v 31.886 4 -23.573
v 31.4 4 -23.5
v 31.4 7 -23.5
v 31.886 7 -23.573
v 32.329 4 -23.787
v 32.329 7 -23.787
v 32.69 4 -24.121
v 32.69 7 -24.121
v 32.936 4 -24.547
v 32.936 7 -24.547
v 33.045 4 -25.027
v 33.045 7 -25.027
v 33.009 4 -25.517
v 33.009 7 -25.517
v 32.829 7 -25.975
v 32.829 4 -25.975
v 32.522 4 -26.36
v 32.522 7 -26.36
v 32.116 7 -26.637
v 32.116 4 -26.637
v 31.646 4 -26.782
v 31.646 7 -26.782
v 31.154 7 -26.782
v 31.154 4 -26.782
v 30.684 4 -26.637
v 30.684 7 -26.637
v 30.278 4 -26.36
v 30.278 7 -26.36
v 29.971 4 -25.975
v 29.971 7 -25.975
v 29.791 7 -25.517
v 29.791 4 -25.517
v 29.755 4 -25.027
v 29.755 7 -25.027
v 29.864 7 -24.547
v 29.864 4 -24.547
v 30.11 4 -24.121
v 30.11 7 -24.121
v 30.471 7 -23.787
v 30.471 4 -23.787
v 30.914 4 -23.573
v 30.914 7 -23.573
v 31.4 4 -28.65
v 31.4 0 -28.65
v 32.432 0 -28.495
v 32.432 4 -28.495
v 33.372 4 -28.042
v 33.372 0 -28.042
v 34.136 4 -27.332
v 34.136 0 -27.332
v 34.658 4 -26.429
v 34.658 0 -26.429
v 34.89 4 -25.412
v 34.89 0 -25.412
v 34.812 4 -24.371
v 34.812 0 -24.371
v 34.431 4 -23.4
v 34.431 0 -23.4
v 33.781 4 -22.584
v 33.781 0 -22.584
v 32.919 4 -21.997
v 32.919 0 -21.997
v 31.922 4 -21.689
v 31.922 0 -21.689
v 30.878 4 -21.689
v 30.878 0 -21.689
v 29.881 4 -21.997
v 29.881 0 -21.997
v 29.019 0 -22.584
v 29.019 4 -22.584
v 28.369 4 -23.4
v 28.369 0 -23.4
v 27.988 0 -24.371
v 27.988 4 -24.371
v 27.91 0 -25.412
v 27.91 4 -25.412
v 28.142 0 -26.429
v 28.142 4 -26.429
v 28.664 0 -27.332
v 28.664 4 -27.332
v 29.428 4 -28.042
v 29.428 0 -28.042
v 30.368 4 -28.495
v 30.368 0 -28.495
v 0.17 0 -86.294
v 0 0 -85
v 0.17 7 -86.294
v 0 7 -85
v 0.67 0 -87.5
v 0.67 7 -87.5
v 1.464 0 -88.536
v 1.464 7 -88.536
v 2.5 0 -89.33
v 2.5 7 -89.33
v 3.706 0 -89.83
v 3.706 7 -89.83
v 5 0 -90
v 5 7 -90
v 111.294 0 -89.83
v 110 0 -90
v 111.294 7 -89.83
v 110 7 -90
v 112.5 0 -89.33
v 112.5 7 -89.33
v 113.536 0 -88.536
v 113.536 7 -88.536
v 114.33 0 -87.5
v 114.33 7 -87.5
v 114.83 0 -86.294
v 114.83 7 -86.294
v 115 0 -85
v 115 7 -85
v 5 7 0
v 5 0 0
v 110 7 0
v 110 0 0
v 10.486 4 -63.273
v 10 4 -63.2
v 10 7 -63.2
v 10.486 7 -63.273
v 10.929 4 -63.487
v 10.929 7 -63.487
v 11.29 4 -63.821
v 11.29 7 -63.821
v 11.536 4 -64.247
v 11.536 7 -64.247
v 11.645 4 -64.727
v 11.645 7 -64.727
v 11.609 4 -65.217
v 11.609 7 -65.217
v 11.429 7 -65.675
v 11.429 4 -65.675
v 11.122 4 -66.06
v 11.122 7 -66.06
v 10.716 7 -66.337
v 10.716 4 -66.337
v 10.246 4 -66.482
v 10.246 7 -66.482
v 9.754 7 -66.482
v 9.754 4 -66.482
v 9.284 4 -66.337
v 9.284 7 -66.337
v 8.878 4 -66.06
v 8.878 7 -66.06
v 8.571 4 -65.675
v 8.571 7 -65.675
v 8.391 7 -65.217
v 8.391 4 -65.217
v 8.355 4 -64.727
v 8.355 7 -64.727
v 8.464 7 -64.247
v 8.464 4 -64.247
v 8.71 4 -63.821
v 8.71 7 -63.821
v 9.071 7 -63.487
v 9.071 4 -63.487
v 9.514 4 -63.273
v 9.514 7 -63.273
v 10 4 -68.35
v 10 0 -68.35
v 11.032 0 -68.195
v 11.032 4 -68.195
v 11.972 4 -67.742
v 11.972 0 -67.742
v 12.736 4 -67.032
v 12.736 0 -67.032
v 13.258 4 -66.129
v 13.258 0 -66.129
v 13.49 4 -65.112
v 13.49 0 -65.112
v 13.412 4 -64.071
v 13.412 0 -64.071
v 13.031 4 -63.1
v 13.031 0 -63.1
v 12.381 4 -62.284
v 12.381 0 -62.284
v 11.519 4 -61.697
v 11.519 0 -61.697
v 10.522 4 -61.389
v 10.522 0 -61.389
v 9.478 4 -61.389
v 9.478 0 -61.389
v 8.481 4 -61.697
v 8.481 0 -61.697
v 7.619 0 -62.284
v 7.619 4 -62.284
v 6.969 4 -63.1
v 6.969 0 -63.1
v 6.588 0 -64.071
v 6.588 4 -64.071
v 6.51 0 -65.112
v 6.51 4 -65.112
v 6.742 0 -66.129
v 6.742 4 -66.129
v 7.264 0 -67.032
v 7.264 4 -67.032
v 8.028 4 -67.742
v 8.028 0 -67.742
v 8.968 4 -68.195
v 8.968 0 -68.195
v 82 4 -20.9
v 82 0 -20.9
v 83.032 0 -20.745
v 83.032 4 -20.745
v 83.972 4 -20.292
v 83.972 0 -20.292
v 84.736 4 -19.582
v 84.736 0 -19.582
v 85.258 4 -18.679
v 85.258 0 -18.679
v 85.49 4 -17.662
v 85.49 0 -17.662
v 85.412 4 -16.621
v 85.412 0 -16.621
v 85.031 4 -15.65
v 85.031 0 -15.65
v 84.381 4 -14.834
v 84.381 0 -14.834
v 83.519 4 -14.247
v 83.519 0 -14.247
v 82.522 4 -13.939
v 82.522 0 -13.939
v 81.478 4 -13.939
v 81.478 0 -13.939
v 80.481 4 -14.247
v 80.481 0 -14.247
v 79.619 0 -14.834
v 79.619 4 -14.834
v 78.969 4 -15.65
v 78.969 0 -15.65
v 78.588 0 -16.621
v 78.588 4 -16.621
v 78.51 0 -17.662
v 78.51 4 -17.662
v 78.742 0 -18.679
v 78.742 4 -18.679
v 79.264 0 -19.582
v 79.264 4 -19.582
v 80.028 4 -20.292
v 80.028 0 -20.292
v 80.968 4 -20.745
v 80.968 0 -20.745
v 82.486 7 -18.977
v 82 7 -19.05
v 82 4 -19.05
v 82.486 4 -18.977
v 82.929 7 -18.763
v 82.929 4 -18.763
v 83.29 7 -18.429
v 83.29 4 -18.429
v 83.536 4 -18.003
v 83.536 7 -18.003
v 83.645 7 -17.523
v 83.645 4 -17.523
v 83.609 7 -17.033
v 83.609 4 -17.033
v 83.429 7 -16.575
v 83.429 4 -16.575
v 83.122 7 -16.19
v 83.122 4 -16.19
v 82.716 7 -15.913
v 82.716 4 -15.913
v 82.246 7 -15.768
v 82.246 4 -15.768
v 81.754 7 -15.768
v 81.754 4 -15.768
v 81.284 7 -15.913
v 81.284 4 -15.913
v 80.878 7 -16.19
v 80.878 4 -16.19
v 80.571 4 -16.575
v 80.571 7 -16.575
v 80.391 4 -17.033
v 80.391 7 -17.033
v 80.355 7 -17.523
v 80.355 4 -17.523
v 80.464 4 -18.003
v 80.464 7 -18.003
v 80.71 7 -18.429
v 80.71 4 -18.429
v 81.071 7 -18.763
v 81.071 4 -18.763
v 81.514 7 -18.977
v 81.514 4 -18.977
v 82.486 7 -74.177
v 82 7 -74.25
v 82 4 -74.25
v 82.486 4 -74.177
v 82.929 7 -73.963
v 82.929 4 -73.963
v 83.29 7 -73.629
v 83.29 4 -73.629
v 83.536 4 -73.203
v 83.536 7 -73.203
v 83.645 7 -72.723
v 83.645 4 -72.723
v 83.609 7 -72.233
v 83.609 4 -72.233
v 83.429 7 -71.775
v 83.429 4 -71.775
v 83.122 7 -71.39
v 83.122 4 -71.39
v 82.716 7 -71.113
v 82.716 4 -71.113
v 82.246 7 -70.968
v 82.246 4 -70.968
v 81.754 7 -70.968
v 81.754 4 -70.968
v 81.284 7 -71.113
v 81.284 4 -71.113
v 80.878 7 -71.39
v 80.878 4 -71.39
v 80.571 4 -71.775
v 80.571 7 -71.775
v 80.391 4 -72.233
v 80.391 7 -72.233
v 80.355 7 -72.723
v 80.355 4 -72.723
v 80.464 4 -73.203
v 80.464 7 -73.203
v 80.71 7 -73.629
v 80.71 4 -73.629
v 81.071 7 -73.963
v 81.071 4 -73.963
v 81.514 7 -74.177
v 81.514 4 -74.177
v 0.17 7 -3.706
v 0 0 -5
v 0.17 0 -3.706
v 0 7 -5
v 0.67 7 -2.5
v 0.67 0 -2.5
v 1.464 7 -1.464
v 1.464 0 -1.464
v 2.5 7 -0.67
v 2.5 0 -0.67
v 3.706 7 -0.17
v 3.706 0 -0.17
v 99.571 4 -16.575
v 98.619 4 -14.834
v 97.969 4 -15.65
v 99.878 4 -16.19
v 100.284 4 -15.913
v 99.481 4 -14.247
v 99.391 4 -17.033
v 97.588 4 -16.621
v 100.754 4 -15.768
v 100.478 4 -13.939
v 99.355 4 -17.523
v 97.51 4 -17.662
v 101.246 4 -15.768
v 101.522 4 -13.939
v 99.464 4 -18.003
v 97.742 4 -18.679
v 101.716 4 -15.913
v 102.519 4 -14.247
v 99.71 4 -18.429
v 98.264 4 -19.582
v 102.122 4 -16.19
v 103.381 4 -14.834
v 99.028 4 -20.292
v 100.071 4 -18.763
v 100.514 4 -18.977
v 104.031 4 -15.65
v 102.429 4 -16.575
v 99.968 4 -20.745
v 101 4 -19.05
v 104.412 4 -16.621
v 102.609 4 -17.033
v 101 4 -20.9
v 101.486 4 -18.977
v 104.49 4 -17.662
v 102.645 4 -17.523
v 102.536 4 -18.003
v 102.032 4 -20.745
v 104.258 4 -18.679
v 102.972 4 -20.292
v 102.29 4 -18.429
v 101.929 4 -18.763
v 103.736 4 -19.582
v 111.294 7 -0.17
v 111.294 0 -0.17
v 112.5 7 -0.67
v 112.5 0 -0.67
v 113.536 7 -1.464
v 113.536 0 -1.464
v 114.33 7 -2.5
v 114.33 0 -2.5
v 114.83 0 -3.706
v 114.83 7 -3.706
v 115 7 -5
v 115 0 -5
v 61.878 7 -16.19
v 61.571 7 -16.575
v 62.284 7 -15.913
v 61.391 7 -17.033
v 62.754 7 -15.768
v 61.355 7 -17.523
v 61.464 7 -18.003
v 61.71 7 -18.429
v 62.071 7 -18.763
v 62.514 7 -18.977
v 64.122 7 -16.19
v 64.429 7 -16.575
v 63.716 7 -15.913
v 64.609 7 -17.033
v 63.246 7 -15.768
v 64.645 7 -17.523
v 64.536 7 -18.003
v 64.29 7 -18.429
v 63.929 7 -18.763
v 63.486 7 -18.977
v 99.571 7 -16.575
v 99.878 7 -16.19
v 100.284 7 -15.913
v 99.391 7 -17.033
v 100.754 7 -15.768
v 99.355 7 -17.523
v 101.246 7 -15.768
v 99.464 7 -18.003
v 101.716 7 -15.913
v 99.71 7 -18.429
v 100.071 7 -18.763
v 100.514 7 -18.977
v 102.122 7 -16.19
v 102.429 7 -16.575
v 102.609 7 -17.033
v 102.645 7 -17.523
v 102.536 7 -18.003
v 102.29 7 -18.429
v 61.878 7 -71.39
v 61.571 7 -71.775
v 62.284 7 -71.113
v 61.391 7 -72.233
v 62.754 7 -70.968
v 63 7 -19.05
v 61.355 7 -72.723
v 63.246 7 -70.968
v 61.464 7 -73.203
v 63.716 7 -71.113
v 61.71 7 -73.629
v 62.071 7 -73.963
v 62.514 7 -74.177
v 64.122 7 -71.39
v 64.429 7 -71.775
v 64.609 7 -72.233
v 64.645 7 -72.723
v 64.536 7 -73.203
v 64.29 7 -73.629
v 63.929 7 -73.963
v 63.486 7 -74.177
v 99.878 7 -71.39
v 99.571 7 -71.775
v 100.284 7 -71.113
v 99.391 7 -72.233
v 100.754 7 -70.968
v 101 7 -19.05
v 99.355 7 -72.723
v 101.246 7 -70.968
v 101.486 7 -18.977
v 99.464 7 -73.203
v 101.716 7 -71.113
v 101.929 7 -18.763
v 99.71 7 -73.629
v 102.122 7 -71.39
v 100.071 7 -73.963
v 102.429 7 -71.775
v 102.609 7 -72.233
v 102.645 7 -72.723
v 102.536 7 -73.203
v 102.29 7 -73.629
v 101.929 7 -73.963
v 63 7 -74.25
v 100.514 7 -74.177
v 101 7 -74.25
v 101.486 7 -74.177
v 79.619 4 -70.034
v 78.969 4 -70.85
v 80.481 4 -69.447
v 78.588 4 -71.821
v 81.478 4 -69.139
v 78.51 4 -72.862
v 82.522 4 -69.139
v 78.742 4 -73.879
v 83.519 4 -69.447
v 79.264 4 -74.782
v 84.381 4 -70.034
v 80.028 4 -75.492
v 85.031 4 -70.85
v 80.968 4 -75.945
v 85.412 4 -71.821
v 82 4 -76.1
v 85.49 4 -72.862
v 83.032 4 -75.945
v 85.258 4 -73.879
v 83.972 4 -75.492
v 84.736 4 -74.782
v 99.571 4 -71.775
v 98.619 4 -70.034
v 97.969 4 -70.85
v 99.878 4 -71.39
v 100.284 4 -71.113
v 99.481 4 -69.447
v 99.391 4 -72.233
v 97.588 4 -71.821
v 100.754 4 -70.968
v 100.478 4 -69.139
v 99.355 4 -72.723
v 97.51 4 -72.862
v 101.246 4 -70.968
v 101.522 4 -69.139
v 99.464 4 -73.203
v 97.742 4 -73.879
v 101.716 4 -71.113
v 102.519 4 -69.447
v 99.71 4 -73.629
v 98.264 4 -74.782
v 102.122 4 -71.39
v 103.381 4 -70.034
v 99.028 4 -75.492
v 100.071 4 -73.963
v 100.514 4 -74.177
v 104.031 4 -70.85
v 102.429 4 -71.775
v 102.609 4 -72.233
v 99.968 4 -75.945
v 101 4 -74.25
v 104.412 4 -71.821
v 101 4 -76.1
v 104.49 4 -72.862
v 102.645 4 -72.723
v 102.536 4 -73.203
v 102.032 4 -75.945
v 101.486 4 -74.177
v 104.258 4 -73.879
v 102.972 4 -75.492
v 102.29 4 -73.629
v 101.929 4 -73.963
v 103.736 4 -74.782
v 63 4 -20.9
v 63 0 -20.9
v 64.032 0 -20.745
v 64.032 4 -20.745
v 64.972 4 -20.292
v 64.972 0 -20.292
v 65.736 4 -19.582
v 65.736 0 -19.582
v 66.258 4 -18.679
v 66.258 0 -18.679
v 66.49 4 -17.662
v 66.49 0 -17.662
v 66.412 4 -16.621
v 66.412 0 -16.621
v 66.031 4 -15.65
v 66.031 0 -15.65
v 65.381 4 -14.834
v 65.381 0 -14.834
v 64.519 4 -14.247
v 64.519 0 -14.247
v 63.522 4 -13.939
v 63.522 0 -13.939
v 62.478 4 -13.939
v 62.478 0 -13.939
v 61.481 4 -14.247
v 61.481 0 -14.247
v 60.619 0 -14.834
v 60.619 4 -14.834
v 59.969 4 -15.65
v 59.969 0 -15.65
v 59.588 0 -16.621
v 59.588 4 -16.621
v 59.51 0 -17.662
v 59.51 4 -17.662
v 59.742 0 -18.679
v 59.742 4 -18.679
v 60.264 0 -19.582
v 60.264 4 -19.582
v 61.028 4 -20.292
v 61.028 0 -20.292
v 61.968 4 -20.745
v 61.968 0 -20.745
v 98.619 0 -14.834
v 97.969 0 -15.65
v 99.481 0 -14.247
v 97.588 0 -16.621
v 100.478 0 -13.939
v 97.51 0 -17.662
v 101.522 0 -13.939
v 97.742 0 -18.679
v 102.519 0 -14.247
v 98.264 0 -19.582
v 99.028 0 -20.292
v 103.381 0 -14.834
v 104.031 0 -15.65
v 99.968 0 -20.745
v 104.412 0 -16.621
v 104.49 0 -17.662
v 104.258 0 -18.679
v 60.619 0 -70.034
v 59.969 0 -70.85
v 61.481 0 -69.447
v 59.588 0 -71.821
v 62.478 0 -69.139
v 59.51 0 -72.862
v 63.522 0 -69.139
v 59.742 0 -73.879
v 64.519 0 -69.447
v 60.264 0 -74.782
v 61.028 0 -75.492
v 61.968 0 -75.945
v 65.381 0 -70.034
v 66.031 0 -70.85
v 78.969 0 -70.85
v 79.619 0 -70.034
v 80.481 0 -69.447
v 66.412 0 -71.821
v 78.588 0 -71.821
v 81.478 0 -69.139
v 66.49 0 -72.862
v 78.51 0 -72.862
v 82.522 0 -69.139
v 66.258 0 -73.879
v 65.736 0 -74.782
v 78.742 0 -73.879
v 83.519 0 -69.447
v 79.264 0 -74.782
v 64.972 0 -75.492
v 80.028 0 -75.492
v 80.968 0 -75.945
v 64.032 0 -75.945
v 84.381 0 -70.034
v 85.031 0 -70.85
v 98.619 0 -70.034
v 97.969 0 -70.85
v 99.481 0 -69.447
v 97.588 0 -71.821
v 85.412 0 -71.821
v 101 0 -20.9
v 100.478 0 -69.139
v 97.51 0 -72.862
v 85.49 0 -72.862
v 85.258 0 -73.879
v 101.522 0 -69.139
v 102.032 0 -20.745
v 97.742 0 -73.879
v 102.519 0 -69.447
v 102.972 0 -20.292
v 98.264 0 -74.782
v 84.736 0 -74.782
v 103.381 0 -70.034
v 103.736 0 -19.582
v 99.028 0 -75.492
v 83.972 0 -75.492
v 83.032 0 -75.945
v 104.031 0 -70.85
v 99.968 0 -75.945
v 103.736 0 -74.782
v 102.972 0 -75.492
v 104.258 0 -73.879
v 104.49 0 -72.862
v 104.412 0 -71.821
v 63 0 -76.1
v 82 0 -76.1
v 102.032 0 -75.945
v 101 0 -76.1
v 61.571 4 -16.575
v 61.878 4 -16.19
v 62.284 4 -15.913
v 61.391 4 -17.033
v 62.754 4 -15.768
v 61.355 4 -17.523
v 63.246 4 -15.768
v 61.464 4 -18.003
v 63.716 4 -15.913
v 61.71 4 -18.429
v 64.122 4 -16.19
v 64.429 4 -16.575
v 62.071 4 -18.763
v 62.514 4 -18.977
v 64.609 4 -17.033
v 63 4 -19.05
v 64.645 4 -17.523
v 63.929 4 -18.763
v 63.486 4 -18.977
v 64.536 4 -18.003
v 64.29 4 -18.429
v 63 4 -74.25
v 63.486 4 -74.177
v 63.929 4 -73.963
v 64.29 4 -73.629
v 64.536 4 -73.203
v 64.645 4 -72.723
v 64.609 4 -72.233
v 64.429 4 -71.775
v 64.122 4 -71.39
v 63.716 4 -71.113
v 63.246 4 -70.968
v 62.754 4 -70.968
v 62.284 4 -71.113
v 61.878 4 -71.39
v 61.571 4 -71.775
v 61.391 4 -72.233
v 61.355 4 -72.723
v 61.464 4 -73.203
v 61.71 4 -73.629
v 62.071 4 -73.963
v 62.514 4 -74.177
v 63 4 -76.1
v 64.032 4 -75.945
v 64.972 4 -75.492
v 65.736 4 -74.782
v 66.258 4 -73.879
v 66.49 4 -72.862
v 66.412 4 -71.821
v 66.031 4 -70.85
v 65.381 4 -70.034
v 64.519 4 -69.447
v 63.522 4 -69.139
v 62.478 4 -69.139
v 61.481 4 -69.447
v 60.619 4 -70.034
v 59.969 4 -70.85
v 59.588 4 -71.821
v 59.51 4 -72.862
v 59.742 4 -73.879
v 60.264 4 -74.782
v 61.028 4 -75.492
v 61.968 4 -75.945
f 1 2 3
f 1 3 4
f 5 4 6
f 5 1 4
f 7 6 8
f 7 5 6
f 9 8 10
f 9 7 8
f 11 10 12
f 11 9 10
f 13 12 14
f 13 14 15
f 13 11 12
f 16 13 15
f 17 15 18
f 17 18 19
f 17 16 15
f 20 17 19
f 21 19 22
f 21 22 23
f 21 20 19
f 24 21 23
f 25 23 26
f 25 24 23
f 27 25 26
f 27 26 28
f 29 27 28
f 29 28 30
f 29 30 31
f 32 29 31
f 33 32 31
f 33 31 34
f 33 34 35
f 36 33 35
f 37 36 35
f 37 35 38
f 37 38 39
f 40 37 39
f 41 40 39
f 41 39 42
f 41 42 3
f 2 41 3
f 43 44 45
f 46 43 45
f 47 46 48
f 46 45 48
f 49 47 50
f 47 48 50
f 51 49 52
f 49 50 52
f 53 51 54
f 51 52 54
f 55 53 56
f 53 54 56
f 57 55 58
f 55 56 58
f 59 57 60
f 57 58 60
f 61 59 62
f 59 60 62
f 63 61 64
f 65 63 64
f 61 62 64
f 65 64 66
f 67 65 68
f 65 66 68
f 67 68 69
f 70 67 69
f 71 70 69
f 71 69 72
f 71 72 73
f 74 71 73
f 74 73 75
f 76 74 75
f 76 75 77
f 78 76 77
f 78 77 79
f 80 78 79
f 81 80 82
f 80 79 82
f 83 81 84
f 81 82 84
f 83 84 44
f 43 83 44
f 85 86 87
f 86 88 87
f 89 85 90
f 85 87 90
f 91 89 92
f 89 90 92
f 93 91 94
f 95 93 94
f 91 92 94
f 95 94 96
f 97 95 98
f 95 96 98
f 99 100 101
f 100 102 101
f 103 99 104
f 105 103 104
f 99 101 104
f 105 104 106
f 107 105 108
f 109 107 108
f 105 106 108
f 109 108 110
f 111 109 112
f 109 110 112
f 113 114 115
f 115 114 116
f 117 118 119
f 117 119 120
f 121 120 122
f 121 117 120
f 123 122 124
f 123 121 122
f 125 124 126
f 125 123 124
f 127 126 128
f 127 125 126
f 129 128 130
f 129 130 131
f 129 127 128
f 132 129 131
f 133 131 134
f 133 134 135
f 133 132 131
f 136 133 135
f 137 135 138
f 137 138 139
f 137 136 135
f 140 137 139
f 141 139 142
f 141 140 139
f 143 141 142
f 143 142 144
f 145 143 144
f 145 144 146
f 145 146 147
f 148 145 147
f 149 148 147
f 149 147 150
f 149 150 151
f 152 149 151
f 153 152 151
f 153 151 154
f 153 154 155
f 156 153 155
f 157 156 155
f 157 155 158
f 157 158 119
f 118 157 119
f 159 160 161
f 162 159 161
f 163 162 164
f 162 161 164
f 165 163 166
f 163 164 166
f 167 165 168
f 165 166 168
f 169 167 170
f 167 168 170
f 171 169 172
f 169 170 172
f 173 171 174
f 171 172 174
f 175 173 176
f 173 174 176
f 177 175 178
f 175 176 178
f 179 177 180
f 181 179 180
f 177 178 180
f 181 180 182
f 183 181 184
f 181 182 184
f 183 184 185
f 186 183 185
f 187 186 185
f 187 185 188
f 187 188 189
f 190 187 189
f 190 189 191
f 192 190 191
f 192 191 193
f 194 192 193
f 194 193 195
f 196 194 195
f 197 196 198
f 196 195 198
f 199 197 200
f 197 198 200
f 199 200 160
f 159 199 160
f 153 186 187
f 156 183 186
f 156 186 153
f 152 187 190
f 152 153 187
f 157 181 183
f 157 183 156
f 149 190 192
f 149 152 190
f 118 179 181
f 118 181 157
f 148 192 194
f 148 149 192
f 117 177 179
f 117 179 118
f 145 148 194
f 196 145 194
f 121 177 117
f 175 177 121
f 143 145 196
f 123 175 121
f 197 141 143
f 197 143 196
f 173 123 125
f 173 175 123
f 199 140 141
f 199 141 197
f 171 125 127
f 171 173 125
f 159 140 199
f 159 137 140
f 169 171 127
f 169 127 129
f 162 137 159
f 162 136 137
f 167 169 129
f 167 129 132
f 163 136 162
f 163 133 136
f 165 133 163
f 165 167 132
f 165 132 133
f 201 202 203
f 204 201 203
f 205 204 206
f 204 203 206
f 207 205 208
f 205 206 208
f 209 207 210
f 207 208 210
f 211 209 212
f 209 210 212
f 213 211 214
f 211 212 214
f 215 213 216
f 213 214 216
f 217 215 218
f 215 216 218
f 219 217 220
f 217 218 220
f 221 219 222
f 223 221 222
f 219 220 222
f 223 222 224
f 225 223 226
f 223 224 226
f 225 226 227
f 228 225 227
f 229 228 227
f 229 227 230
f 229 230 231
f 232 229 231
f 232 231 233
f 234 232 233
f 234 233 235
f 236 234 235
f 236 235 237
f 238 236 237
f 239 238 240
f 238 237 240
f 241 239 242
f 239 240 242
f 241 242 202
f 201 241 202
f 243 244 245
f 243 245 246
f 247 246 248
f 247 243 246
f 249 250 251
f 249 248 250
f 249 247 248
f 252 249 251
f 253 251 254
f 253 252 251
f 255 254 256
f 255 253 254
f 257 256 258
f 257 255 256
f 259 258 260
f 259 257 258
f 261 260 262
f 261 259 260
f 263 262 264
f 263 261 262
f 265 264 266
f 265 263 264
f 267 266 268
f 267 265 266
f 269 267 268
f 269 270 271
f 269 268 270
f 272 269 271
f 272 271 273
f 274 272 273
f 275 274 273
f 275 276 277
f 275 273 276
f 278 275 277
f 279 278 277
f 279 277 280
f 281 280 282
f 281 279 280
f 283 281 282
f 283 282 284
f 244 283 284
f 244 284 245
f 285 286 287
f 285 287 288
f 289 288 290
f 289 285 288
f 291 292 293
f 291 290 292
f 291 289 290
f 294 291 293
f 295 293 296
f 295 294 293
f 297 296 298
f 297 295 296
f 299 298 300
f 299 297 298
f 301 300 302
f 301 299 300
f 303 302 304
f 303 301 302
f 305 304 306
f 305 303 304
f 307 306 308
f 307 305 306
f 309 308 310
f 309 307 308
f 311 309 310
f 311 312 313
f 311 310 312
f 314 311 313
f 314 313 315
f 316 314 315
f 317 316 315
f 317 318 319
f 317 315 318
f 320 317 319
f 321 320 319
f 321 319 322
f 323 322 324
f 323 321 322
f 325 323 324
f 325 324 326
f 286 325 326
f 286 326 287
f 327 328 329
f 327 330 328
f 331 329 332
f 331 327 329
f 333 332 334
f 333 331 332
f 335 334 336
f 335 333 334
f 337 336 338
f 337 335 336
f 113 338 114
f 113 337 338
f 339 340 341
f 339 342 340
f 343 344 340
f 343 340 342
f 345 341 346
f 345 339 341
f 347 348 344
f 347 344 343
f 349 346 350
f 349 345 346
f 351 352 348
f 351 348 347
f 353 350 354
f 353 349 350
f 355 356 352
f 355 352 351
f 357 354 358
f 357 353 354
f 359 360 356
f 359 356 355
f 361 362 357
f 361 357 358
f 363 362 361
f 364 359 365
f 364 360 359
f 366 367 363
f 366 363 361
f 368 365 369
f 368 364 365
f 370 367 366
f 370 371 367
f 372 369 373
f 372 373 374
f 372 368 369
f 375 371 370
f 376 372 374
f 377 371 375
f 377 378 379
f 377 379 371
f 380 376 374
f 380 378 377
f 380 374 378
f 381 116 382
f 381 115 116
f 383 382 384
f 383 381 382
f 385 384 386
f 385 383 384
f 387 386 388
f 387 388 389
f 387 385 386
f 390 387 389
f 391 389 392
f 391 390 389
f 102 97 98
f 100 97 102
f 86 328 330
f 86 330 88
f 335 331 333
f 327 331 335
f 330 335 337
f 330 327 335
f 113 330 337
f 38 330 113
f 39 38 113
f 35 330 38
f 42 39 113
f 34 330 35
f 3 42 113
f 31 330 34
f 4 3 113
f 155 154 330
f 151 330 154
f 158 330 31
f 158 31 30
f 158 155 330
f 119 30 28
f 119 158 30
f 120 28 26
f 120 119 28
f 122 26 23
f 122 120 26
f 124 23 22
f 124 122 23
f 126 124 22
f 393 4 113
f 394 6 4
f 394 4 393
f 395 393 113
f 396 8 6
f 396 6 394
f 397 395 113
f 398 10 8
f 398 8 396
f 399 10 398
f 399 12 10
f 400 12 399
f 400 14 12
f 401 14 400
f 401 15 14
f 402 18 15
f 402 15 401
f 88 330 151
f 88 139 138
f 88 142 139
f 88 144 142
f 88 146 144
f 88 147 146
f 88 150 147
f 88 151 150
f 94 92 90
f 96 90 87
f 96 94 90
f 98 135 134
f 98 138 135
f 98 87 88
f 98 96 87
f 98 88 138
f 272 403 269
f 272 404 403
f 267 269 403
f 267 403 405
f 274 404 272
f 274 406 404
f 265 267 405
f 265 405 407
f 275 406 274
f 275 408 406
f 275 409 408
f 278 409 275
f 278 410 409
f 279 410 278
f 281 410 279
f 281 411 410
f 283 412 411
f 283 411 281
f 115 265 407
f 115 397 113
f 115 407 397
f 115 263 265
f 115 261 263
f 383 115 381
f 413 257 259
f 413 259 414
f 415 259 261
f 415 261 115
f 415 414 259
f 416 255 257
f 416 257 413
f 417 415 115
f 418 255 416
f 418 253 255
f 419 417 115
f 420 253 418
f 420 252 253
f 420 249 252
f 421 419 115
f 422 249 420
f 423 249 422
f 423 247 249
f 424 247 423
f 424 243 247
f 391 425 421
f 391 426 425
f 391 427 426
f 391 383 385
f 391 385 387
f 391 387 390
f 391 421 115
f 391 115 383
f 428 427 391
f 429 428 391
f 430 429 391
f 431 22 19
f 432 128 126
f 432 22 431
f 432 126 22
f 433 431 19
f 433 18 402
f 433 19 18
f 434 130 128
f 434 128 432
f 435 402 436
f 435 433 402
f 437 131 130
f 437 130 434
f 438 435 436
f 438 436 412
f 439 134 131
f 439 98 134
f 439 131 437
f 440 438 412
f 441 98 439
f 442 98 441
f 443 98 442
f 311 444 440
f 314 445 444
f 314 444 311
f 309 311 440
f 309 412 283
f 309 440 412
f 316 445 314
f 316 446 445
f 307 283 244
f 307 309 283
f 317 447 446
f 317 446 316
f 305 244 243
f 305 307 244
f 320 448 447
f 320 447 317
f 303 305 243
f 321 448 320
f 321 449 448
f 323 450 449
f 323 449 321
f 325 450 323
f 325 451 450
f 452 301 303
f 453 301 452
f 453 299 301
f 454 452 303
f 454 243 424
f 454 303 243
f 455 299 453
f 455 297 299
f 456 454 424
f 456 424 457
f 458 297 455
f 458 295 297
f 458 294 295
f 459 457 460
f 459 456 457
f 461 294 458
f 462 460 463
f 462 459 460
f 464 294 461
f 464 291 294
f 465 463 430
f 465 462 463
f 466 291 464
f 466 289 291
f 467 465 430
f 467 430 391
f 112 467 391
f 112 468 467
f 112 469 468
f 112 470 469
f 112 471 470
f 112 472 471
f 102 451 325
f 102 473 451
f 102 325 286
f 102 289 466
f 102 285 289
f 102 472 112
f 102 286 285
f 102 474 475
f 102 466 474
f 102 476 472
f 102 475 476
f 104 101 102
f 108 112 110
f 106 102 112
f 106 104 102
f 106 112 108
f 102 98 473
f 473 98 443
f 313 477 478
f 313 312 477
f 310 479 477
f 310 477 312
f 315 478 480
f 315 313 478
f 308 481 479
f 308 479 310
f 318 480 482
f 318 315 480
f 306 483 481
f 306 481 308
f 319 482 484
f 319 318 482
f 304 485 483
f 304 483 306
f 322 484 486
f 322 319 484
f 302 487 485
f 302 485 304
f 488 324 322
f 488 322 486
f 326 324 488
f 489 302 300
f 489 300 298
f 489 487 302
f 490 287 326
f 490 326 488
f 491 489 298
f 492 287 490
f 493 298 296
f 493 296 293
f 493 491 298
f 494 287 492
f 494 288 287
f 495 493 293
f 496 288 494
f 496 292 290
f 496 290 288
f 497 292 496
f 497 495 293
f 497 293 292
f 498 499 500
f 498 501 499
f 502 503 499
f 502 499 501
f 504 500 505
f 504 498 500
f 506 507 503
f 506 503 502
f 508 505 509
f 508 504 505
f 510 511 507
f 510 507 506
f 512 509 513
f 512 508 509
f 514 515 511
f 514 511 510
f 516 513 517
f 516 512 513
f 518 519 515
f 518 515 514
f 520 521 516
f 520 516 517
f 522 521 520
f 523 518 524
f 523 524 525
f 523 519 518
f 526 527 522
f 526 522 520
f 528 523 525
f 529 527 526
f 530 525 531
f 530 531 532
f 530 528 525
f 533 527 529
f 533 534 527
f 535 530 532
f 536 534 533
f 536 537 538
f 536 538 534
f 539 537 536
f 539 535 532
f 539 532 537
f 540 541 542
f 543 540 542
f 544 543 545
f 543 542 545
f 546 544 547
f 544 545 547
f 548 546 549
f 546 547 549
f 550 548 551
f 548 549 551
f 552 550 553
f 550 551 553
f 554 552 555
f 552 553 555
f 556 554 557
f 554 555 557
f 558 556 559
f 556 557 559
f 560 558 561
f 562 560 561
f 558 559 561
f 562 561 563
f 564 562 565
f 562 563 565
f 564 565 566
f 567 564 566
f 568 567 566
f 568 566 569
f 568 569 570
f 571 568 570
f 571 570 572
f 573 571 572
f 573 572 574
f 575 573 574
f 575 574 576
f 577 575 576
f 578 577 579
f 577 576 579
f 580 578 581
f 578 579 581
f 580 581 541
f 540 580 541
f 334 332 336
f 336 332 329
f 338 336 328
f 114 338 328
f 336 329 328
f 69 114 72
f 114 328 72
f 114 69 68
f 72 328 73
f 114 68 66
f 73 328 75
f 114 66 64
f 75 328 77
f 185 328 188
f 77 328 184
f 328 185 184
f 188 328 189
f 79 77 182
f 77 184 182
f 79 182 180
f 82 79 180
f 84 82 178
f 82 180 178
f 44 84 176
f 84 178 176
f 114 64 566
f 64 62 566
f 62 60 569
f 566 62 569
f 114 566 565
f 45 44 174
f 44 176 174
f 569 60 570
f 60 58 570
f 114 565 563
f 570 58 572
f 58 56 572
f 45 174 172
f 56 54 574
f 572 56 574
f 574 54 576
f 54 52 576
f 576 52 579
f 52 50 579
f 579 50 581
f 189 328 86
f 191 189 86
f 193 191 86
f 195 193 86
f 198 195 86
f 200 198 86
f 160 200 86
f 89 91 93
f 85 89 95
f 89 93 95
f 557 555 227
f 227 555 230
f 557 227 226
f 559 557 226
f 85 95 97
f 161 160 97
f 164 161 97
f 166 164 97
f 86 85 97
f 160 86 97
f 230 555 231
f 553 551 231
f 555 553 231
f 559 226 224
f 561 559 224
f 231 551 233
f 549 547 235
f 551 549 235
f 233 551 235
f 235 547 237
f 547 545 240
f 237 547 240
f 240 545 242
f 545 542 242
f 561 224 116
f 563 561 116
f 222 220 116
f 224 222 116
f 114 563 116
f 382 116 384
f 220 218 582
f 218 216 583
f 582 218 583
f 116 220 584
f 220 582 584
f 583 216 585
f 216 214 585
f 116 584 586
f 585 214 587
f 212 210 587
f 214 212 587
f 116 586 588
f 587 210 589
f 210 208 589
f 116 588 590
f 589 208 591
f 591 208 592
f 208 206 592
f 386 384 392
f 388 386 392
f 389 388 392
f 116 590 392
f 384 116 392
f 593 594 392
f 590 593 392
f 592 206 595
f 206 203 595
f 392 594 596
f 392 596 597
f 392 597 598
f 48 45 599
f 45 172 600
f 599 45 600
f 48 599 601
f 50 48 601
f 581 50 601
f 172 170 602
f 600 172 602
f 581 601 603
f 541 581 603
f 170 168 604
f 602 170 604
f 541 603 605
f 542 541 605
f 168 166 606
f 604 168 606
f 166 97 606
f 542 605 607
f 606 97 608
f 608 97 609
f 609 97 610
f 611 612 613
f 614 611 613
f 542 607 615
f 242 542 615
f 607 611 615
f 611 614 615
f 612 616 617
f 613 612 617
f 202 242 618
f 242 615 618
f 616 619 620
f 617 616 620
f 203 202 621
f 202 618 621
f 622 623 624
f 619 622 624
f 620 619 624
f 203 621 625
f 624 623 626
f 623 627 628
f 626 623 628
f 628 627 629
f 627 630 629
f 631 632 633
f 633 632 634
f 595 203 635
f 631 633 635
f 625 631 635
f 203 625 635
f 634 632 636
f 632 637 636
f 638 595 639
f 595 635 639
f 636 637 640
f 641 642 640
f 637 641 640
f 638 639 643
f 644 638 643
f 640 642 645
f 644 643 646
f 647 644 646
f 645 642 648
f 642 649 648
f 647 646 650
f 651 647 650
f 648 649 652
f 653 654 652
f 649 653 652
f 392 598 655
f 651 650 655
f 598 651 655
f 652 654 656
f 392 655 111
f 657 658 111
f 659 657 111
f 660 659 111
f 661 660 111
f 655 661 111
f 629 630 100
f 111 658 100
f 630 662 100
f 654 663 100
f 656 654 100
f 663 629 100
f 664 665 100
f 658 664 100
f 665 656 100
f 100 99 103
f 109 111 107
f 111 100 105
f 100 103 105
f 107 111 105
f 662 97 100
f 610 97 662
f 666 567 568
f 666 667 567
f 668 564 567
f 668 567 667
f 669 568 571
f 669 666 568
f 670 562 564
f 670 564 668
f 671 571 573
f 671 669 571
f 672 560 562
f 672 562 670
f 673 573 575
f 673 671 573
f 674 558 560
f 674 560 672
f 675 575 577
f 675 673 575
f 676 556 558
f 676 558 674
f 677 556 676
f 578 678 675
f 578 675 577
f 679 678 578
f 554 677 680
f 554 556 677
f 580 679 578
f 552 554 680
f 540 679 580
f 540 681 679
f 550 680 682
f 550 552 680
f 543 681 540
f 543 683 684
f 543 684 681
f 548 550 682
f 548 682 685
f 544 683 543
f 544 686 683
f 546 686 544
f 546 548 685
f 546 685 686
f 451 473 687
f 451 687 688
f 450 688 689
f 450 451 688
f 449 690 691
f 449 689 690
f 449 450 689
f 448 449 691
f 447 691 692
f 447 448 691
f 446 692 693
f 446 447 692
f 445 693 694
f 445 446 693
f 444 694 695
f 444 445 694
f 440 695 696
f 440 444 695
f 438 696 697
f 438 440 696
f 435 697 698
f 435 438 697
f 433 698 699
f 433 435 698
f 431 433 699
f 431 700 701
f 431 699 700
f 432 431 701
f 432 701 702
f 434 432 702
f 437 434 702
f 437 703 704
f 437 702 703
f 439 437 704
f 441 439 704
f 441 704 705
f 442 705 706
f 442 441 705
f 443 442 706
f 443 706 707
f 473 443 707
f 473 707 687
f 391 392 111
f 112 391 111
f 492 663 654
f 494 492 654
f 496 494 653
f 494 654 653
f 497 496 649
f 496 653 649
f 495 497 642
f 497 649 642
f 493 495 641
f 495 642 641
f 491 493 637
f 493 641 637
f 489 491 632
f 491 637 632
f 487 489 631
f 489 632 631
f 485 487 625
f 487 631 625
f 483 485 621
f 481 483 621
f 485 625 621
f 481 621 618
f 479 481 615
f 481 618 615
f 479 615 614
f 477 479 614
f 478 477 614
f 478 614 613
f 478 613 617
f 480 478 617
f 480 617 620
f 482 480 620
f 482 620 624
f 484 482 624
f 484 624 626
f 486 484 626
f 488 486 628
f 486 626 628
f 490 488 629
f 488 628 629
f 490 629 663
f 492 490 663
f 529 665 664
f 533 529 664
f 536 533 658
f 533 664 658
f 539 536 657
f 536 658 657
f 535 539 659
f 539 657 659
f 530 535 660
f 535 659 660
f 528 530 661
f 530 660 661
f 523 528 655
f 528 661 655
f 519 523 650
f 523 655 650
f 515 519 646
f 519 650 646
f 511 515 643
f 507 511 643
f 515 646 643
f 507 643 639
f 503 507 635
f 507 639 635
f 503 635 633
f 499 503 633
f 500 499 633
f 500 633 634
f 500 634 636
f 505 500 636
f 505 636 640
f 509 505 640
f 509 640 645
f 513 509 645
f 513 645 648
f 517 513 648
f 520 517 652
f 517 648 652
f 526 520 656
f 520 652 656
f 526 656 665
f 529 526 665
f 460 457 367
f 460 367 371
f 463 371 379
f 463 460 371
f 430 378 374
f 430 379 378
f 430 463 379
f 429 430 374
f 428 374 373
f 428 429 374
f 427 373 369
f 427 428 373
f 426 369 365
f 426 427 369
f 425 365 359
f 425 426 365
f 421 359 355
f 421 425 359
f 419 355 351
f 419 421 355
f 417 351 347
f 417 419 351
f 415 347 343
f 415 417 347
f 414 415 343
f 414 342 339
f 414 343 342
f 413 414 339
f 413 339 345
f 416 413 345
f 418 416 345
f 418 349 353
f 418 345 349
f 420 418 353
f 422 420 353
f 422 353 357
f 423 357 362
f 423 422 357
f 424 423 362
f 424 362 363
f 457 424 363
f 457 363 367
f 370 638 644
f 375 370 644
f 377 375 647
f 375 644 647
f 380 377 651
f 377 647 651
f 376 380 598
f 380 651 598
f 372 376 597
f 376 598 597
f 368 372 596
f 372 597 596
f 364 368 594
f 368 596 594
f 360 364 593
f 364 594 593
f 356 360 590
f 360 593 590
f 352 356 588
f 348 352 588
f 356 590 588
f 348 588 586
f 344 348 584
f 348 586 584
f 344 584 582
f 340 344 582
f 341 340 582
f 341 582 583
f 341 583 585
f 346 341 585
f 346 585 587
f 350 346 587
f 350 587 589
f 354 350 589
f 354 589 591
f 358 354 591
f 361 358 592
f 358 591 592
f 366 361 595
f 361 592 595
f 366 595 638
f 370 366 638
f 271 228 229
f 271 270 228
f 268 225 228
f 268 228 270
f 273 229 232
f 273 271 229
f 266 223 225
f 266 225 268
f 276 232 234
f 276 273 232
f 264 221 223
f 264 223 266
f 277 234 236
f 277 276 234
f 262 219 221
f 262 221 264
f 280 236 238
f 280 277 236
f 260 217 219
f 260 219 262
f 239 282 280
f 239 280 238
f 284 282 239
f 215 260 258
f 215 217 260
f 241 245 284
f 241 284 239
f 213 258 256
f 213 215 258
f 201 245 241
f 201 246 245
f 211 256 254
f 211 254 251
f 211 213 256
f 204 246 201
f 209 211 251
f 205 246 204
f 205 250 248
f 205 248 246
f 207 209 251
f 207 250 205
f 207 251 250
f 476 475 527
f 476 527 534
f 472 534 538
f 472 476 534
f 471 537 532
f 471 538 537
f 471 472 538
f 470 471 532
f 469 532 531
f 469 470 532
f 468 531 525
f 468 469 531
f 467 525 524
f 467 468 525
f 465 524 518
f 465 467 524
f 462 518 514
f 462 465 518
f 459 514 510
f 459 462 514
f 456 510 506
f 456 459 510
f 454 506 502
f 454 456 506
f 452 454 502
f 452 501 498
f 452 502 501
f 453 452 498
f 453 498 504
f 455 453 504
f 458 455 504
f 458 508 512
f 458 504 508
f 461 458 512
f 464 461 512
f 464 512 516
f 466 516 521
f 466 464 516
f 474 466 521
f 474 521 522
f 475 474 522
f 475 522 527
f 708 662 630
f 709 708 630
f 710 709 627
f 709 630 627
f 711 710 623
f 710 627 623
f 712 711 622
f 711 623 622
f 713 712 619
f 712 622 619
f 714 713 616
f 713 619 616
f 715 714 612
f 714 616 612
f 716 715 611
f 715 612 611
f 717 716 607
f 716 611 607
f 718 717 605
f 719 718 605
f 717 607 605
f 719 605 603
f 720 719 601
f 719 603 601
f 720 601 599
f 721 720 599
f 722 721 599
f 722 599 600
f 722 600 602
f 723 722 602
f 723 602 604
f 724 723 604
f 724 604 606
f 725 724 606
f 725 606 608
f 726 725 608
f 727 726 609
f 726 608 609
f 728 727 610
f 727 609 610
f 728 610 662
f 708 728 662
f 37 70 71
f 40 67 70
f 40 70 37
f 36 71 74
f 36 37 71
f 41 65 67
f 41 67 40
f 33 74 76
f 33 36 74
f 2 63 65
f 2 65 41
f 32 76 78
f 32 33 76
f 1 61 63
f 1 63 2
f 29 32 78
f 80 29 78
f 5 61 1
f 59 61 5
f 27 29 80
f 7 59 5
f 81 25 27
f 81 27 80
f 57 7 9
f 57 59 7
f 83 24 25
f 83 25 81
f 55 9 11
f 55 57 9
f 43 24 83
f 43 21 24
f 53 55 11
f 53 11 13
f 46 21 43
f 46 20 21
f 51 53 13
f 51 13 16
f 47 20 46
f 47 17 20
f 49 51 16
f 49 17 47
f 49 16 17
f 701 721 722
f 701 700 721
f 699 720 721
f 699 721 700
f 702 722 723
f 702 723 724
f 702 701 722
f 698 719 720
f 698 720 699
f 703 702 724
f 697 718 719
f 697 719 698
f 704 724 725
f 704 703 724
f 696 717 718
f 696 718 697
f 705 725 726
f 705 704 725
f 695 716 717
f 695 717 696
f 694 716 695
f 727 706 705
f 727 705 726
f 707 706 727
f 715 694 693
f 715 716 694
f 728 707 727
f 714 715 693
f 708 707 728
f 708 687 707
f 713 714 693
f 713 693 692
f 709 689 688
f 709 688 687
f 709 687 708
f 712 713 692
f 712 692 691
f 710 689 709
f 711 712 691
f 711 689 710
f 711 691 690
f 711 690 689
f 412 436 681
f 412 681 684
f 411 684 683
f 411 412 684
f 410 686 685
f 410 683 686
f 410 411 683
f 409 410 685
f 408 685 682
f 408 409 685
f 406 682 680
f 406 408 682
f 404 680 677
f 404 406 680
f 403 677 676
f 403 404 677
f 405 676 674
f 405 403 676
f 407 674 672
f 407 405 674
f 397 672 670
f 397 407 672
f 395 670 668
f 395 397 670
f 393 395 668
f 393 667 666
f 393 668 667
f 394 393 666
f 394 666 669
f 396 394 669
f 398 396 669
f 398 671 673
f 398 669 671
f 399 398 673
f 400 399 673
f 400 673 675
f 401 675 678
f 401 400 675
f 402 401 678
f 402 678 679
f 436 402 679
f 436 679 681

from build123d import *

# Parameters (mm, degrees)
SKETCH1_W               = 115
SKETCH1_H               = 90
SKETCH1_R               = 1.65
BOSS_EXTRUDE2_DEPTH     = 7
CUT_EXTRUDE4_DEPTH      = 147.198495204
CUT_EXTRUDE4_DEPTH_BACK = 147.198495204
SKETCH5_R               = 1.65
FILLET1_R               = 5
SKETCH8_R               = 3.5
CUT_EXTRUDE6_DEPTH      = 4


with BuildPart() as part:
    # Sketch1 → Boss-Extrude2 (new body)
    with BuildSketch(Plane(origin=(0, 0, 0), x_dir=(1, 0, 0), z_dir=(0, 1, 0))):
        with Locations((57.5, 45)):
            Rectangle(SKETCH1_W, SKETCH1_H)
        with Locations(Location((10, 64.85, 0), (0, 0, 270))):
            Circle(SKETCH1_R, mode=Mode.SUBTRACT)
        with Locations(Location((31.4, 25.15, 0), (0, 0, 270))):
            Circle(SKETCH1_R, mode=Mode.SUBTRACT)
    extrude(amount=BOSS_EXTRUDE2_DEPTH)

    # Sketch5 → Cut-Extrude4 (cut, two sides: drawn at the far end of the back side and taken through both)
    with BuildSketch(Plane(origin=(0, 0, 0), x_dir=(-1, 0, 0), z_dir=(0, -1, 0)).offset(-CUT_EXTRUDE4_DEPTH_BACK)):
        with Locations(Location((-101, 17.4, 0), (0, 0, 90))):
            Circle(SKETCH5_R)
        with Locations(Location((-101, 72.6, 0), (0, 0, 90))):
            Circle(SKETCH5_R)
        with Locations(Location((-82, 17.4, 0), (0, 0, 90))):
            Circle(SKETCH5_R)
        with Locations(Location((-82, 72.6, 0), (0, 0, 90))):
            Circle(SKETCH5_R)
        with Locations(Location((-63, 17.4, 0), (0, 0, 90))):
            Circle(SKETCH5_R)
        with Locations(Location((-63, 72.6, 0), (0, 0, 90))):
            Circle(SKETCH5_R)
    extrude(amount=CUT_EXTRUDE4_DEPTH + CUT_EXTRUDE4_DEPTH_BACK, mode=Mode.SUBTRACT)

    # Fillet1
    fillet1_edges = [part.edges().sort_by_distance(p)[0] for p in [
        (0, 3.5, -90),
        (115, 3.5, -90),
        (115, 3.5, 0),
        (0, 3.5, 0),
    ]]
    fillet(fillet1_edges, radius=FILLET1_R)

    # Sketch8 → Cut-Extrude6 (cut)
    with BuildSketch(Plane.XZ):
        with Locations(Location((31.4, -25.15, 0), (0, 0, 270))):
            Circle(SKETCH8_R)
        with Locations(Location((10, -64.85, 0), (0, 0, 270))):
            Circle(SKETCH8_R)
        with Locations(Location((63, -72.6, 0), (0, 0, 270))):
            Circle(SKETCH8_R)
        with Locations(Location((82, -72.6, 0), (0, 0, 270))):
            Circle(SKETCH8_R)
        with Locations(Location((101, -72.6, 0), (0, 0, 270))):
            Circle(SKETCH8_R)
        with Locations(Location((63, -17.4, 0), (0, 0, 270))):
            Circle(SKETCH8_R)
        with Locations(Location((82, -17.4, 0), (0, 0, 270))):
            Circle(SKETCH8_R)
        with Locations(Location((101, -17.4, 0), (0, 0, 270))):
            Circle(SKETCH8_R)
    extrude(amount=-CUT_EXTRUDE6_DEPTH, mode=Mode.SUBTRACT)


solid = part.part
